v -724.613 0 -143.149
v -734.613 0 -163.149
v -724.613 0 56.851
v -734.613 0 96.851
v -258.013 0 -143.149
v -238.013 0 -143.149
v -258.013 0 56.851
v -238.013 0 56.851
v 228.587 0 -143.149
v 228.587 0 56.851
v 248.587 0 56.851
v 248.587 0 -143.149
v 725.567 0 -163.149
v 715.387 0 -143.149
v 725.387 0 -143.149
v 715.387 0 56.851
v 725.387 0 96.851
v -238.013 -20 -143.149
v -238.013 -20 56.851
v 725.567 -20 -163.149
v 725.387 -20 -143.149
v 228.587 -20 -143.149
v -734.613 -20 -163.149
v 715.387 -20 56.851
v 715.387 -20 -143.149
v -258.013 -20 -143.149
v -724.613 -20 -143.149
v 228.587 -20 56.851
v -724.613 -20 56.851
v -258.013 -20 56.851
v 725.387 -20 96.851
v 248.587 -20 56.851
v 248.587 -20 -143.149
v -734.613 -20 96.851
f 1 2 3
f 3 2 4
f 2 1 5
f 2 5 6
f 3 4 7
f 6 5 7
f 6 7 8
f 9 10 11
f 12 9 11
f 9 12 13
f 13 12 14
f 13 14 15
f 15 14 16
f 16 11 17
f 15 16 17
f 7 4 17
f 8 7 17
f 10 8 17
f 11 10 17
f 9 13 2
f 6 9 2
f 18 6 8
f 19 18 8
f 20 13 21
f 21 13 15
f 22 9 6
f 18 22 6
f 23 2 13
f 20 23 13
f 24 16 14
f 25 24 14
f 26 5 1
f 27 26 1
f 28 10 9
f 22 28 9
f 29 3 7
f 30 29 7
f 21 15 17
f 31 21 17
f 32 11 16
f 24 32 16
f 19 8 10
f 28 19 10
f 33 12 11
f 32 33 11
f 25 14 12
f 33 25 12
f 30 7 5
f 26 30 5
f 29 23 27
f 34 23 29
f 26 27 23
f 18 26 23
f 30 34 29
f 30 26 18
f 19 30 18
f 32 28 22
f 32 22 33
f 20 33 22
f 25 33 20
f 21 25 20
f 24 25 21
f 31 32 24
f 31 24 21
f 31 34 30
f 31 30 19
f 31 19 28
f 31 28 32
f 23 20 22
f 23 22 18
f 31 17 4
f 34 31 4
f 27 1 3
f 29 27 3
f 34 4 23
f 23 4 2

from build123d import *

# Parameters (mm, degrees)
F1_DEPTH = 20


with BuildPart() as f1:
    # F0 (on Front) → F1 (new body)
    with BuildSketch(Plane.XZ):
        Polygon((725.387353, 96.851042), (-734.612647, 96.851042), (-734.612647, 56.851042), (-734.612647, -143.148958), (-724.612647, -143.148958), (-724.612647, 56.851042), (-258.012647, 56.851042), (-258.012647, -143.148958), (-238.012647, -143.148958), (-238.012647, 56.851042), (228.587353, 56.851042), (228.587353, -143.148958), (248.587353, -143.148958), (248.587353, 56.851042), (715.387353, 56.851042), (715.387353, -143.148958), (725.387353, -143.148958), (725.387353, 56.851042), align=None)
        Polygon((-724.612647, -143.148958), (-734.612647, -143.148958), (-734.612647, -163.148958), (725.567341, -163.148958), (725.387353, -143.148958), (715.387353, -143.148958), (248.587353, -143.148958), (228.587353, -143.148958), (-238.012647, -143.148958), (-258.012647, -143.148958), align=None)
    extrude(amount=F1_DEPTH)


solid = f1.part
